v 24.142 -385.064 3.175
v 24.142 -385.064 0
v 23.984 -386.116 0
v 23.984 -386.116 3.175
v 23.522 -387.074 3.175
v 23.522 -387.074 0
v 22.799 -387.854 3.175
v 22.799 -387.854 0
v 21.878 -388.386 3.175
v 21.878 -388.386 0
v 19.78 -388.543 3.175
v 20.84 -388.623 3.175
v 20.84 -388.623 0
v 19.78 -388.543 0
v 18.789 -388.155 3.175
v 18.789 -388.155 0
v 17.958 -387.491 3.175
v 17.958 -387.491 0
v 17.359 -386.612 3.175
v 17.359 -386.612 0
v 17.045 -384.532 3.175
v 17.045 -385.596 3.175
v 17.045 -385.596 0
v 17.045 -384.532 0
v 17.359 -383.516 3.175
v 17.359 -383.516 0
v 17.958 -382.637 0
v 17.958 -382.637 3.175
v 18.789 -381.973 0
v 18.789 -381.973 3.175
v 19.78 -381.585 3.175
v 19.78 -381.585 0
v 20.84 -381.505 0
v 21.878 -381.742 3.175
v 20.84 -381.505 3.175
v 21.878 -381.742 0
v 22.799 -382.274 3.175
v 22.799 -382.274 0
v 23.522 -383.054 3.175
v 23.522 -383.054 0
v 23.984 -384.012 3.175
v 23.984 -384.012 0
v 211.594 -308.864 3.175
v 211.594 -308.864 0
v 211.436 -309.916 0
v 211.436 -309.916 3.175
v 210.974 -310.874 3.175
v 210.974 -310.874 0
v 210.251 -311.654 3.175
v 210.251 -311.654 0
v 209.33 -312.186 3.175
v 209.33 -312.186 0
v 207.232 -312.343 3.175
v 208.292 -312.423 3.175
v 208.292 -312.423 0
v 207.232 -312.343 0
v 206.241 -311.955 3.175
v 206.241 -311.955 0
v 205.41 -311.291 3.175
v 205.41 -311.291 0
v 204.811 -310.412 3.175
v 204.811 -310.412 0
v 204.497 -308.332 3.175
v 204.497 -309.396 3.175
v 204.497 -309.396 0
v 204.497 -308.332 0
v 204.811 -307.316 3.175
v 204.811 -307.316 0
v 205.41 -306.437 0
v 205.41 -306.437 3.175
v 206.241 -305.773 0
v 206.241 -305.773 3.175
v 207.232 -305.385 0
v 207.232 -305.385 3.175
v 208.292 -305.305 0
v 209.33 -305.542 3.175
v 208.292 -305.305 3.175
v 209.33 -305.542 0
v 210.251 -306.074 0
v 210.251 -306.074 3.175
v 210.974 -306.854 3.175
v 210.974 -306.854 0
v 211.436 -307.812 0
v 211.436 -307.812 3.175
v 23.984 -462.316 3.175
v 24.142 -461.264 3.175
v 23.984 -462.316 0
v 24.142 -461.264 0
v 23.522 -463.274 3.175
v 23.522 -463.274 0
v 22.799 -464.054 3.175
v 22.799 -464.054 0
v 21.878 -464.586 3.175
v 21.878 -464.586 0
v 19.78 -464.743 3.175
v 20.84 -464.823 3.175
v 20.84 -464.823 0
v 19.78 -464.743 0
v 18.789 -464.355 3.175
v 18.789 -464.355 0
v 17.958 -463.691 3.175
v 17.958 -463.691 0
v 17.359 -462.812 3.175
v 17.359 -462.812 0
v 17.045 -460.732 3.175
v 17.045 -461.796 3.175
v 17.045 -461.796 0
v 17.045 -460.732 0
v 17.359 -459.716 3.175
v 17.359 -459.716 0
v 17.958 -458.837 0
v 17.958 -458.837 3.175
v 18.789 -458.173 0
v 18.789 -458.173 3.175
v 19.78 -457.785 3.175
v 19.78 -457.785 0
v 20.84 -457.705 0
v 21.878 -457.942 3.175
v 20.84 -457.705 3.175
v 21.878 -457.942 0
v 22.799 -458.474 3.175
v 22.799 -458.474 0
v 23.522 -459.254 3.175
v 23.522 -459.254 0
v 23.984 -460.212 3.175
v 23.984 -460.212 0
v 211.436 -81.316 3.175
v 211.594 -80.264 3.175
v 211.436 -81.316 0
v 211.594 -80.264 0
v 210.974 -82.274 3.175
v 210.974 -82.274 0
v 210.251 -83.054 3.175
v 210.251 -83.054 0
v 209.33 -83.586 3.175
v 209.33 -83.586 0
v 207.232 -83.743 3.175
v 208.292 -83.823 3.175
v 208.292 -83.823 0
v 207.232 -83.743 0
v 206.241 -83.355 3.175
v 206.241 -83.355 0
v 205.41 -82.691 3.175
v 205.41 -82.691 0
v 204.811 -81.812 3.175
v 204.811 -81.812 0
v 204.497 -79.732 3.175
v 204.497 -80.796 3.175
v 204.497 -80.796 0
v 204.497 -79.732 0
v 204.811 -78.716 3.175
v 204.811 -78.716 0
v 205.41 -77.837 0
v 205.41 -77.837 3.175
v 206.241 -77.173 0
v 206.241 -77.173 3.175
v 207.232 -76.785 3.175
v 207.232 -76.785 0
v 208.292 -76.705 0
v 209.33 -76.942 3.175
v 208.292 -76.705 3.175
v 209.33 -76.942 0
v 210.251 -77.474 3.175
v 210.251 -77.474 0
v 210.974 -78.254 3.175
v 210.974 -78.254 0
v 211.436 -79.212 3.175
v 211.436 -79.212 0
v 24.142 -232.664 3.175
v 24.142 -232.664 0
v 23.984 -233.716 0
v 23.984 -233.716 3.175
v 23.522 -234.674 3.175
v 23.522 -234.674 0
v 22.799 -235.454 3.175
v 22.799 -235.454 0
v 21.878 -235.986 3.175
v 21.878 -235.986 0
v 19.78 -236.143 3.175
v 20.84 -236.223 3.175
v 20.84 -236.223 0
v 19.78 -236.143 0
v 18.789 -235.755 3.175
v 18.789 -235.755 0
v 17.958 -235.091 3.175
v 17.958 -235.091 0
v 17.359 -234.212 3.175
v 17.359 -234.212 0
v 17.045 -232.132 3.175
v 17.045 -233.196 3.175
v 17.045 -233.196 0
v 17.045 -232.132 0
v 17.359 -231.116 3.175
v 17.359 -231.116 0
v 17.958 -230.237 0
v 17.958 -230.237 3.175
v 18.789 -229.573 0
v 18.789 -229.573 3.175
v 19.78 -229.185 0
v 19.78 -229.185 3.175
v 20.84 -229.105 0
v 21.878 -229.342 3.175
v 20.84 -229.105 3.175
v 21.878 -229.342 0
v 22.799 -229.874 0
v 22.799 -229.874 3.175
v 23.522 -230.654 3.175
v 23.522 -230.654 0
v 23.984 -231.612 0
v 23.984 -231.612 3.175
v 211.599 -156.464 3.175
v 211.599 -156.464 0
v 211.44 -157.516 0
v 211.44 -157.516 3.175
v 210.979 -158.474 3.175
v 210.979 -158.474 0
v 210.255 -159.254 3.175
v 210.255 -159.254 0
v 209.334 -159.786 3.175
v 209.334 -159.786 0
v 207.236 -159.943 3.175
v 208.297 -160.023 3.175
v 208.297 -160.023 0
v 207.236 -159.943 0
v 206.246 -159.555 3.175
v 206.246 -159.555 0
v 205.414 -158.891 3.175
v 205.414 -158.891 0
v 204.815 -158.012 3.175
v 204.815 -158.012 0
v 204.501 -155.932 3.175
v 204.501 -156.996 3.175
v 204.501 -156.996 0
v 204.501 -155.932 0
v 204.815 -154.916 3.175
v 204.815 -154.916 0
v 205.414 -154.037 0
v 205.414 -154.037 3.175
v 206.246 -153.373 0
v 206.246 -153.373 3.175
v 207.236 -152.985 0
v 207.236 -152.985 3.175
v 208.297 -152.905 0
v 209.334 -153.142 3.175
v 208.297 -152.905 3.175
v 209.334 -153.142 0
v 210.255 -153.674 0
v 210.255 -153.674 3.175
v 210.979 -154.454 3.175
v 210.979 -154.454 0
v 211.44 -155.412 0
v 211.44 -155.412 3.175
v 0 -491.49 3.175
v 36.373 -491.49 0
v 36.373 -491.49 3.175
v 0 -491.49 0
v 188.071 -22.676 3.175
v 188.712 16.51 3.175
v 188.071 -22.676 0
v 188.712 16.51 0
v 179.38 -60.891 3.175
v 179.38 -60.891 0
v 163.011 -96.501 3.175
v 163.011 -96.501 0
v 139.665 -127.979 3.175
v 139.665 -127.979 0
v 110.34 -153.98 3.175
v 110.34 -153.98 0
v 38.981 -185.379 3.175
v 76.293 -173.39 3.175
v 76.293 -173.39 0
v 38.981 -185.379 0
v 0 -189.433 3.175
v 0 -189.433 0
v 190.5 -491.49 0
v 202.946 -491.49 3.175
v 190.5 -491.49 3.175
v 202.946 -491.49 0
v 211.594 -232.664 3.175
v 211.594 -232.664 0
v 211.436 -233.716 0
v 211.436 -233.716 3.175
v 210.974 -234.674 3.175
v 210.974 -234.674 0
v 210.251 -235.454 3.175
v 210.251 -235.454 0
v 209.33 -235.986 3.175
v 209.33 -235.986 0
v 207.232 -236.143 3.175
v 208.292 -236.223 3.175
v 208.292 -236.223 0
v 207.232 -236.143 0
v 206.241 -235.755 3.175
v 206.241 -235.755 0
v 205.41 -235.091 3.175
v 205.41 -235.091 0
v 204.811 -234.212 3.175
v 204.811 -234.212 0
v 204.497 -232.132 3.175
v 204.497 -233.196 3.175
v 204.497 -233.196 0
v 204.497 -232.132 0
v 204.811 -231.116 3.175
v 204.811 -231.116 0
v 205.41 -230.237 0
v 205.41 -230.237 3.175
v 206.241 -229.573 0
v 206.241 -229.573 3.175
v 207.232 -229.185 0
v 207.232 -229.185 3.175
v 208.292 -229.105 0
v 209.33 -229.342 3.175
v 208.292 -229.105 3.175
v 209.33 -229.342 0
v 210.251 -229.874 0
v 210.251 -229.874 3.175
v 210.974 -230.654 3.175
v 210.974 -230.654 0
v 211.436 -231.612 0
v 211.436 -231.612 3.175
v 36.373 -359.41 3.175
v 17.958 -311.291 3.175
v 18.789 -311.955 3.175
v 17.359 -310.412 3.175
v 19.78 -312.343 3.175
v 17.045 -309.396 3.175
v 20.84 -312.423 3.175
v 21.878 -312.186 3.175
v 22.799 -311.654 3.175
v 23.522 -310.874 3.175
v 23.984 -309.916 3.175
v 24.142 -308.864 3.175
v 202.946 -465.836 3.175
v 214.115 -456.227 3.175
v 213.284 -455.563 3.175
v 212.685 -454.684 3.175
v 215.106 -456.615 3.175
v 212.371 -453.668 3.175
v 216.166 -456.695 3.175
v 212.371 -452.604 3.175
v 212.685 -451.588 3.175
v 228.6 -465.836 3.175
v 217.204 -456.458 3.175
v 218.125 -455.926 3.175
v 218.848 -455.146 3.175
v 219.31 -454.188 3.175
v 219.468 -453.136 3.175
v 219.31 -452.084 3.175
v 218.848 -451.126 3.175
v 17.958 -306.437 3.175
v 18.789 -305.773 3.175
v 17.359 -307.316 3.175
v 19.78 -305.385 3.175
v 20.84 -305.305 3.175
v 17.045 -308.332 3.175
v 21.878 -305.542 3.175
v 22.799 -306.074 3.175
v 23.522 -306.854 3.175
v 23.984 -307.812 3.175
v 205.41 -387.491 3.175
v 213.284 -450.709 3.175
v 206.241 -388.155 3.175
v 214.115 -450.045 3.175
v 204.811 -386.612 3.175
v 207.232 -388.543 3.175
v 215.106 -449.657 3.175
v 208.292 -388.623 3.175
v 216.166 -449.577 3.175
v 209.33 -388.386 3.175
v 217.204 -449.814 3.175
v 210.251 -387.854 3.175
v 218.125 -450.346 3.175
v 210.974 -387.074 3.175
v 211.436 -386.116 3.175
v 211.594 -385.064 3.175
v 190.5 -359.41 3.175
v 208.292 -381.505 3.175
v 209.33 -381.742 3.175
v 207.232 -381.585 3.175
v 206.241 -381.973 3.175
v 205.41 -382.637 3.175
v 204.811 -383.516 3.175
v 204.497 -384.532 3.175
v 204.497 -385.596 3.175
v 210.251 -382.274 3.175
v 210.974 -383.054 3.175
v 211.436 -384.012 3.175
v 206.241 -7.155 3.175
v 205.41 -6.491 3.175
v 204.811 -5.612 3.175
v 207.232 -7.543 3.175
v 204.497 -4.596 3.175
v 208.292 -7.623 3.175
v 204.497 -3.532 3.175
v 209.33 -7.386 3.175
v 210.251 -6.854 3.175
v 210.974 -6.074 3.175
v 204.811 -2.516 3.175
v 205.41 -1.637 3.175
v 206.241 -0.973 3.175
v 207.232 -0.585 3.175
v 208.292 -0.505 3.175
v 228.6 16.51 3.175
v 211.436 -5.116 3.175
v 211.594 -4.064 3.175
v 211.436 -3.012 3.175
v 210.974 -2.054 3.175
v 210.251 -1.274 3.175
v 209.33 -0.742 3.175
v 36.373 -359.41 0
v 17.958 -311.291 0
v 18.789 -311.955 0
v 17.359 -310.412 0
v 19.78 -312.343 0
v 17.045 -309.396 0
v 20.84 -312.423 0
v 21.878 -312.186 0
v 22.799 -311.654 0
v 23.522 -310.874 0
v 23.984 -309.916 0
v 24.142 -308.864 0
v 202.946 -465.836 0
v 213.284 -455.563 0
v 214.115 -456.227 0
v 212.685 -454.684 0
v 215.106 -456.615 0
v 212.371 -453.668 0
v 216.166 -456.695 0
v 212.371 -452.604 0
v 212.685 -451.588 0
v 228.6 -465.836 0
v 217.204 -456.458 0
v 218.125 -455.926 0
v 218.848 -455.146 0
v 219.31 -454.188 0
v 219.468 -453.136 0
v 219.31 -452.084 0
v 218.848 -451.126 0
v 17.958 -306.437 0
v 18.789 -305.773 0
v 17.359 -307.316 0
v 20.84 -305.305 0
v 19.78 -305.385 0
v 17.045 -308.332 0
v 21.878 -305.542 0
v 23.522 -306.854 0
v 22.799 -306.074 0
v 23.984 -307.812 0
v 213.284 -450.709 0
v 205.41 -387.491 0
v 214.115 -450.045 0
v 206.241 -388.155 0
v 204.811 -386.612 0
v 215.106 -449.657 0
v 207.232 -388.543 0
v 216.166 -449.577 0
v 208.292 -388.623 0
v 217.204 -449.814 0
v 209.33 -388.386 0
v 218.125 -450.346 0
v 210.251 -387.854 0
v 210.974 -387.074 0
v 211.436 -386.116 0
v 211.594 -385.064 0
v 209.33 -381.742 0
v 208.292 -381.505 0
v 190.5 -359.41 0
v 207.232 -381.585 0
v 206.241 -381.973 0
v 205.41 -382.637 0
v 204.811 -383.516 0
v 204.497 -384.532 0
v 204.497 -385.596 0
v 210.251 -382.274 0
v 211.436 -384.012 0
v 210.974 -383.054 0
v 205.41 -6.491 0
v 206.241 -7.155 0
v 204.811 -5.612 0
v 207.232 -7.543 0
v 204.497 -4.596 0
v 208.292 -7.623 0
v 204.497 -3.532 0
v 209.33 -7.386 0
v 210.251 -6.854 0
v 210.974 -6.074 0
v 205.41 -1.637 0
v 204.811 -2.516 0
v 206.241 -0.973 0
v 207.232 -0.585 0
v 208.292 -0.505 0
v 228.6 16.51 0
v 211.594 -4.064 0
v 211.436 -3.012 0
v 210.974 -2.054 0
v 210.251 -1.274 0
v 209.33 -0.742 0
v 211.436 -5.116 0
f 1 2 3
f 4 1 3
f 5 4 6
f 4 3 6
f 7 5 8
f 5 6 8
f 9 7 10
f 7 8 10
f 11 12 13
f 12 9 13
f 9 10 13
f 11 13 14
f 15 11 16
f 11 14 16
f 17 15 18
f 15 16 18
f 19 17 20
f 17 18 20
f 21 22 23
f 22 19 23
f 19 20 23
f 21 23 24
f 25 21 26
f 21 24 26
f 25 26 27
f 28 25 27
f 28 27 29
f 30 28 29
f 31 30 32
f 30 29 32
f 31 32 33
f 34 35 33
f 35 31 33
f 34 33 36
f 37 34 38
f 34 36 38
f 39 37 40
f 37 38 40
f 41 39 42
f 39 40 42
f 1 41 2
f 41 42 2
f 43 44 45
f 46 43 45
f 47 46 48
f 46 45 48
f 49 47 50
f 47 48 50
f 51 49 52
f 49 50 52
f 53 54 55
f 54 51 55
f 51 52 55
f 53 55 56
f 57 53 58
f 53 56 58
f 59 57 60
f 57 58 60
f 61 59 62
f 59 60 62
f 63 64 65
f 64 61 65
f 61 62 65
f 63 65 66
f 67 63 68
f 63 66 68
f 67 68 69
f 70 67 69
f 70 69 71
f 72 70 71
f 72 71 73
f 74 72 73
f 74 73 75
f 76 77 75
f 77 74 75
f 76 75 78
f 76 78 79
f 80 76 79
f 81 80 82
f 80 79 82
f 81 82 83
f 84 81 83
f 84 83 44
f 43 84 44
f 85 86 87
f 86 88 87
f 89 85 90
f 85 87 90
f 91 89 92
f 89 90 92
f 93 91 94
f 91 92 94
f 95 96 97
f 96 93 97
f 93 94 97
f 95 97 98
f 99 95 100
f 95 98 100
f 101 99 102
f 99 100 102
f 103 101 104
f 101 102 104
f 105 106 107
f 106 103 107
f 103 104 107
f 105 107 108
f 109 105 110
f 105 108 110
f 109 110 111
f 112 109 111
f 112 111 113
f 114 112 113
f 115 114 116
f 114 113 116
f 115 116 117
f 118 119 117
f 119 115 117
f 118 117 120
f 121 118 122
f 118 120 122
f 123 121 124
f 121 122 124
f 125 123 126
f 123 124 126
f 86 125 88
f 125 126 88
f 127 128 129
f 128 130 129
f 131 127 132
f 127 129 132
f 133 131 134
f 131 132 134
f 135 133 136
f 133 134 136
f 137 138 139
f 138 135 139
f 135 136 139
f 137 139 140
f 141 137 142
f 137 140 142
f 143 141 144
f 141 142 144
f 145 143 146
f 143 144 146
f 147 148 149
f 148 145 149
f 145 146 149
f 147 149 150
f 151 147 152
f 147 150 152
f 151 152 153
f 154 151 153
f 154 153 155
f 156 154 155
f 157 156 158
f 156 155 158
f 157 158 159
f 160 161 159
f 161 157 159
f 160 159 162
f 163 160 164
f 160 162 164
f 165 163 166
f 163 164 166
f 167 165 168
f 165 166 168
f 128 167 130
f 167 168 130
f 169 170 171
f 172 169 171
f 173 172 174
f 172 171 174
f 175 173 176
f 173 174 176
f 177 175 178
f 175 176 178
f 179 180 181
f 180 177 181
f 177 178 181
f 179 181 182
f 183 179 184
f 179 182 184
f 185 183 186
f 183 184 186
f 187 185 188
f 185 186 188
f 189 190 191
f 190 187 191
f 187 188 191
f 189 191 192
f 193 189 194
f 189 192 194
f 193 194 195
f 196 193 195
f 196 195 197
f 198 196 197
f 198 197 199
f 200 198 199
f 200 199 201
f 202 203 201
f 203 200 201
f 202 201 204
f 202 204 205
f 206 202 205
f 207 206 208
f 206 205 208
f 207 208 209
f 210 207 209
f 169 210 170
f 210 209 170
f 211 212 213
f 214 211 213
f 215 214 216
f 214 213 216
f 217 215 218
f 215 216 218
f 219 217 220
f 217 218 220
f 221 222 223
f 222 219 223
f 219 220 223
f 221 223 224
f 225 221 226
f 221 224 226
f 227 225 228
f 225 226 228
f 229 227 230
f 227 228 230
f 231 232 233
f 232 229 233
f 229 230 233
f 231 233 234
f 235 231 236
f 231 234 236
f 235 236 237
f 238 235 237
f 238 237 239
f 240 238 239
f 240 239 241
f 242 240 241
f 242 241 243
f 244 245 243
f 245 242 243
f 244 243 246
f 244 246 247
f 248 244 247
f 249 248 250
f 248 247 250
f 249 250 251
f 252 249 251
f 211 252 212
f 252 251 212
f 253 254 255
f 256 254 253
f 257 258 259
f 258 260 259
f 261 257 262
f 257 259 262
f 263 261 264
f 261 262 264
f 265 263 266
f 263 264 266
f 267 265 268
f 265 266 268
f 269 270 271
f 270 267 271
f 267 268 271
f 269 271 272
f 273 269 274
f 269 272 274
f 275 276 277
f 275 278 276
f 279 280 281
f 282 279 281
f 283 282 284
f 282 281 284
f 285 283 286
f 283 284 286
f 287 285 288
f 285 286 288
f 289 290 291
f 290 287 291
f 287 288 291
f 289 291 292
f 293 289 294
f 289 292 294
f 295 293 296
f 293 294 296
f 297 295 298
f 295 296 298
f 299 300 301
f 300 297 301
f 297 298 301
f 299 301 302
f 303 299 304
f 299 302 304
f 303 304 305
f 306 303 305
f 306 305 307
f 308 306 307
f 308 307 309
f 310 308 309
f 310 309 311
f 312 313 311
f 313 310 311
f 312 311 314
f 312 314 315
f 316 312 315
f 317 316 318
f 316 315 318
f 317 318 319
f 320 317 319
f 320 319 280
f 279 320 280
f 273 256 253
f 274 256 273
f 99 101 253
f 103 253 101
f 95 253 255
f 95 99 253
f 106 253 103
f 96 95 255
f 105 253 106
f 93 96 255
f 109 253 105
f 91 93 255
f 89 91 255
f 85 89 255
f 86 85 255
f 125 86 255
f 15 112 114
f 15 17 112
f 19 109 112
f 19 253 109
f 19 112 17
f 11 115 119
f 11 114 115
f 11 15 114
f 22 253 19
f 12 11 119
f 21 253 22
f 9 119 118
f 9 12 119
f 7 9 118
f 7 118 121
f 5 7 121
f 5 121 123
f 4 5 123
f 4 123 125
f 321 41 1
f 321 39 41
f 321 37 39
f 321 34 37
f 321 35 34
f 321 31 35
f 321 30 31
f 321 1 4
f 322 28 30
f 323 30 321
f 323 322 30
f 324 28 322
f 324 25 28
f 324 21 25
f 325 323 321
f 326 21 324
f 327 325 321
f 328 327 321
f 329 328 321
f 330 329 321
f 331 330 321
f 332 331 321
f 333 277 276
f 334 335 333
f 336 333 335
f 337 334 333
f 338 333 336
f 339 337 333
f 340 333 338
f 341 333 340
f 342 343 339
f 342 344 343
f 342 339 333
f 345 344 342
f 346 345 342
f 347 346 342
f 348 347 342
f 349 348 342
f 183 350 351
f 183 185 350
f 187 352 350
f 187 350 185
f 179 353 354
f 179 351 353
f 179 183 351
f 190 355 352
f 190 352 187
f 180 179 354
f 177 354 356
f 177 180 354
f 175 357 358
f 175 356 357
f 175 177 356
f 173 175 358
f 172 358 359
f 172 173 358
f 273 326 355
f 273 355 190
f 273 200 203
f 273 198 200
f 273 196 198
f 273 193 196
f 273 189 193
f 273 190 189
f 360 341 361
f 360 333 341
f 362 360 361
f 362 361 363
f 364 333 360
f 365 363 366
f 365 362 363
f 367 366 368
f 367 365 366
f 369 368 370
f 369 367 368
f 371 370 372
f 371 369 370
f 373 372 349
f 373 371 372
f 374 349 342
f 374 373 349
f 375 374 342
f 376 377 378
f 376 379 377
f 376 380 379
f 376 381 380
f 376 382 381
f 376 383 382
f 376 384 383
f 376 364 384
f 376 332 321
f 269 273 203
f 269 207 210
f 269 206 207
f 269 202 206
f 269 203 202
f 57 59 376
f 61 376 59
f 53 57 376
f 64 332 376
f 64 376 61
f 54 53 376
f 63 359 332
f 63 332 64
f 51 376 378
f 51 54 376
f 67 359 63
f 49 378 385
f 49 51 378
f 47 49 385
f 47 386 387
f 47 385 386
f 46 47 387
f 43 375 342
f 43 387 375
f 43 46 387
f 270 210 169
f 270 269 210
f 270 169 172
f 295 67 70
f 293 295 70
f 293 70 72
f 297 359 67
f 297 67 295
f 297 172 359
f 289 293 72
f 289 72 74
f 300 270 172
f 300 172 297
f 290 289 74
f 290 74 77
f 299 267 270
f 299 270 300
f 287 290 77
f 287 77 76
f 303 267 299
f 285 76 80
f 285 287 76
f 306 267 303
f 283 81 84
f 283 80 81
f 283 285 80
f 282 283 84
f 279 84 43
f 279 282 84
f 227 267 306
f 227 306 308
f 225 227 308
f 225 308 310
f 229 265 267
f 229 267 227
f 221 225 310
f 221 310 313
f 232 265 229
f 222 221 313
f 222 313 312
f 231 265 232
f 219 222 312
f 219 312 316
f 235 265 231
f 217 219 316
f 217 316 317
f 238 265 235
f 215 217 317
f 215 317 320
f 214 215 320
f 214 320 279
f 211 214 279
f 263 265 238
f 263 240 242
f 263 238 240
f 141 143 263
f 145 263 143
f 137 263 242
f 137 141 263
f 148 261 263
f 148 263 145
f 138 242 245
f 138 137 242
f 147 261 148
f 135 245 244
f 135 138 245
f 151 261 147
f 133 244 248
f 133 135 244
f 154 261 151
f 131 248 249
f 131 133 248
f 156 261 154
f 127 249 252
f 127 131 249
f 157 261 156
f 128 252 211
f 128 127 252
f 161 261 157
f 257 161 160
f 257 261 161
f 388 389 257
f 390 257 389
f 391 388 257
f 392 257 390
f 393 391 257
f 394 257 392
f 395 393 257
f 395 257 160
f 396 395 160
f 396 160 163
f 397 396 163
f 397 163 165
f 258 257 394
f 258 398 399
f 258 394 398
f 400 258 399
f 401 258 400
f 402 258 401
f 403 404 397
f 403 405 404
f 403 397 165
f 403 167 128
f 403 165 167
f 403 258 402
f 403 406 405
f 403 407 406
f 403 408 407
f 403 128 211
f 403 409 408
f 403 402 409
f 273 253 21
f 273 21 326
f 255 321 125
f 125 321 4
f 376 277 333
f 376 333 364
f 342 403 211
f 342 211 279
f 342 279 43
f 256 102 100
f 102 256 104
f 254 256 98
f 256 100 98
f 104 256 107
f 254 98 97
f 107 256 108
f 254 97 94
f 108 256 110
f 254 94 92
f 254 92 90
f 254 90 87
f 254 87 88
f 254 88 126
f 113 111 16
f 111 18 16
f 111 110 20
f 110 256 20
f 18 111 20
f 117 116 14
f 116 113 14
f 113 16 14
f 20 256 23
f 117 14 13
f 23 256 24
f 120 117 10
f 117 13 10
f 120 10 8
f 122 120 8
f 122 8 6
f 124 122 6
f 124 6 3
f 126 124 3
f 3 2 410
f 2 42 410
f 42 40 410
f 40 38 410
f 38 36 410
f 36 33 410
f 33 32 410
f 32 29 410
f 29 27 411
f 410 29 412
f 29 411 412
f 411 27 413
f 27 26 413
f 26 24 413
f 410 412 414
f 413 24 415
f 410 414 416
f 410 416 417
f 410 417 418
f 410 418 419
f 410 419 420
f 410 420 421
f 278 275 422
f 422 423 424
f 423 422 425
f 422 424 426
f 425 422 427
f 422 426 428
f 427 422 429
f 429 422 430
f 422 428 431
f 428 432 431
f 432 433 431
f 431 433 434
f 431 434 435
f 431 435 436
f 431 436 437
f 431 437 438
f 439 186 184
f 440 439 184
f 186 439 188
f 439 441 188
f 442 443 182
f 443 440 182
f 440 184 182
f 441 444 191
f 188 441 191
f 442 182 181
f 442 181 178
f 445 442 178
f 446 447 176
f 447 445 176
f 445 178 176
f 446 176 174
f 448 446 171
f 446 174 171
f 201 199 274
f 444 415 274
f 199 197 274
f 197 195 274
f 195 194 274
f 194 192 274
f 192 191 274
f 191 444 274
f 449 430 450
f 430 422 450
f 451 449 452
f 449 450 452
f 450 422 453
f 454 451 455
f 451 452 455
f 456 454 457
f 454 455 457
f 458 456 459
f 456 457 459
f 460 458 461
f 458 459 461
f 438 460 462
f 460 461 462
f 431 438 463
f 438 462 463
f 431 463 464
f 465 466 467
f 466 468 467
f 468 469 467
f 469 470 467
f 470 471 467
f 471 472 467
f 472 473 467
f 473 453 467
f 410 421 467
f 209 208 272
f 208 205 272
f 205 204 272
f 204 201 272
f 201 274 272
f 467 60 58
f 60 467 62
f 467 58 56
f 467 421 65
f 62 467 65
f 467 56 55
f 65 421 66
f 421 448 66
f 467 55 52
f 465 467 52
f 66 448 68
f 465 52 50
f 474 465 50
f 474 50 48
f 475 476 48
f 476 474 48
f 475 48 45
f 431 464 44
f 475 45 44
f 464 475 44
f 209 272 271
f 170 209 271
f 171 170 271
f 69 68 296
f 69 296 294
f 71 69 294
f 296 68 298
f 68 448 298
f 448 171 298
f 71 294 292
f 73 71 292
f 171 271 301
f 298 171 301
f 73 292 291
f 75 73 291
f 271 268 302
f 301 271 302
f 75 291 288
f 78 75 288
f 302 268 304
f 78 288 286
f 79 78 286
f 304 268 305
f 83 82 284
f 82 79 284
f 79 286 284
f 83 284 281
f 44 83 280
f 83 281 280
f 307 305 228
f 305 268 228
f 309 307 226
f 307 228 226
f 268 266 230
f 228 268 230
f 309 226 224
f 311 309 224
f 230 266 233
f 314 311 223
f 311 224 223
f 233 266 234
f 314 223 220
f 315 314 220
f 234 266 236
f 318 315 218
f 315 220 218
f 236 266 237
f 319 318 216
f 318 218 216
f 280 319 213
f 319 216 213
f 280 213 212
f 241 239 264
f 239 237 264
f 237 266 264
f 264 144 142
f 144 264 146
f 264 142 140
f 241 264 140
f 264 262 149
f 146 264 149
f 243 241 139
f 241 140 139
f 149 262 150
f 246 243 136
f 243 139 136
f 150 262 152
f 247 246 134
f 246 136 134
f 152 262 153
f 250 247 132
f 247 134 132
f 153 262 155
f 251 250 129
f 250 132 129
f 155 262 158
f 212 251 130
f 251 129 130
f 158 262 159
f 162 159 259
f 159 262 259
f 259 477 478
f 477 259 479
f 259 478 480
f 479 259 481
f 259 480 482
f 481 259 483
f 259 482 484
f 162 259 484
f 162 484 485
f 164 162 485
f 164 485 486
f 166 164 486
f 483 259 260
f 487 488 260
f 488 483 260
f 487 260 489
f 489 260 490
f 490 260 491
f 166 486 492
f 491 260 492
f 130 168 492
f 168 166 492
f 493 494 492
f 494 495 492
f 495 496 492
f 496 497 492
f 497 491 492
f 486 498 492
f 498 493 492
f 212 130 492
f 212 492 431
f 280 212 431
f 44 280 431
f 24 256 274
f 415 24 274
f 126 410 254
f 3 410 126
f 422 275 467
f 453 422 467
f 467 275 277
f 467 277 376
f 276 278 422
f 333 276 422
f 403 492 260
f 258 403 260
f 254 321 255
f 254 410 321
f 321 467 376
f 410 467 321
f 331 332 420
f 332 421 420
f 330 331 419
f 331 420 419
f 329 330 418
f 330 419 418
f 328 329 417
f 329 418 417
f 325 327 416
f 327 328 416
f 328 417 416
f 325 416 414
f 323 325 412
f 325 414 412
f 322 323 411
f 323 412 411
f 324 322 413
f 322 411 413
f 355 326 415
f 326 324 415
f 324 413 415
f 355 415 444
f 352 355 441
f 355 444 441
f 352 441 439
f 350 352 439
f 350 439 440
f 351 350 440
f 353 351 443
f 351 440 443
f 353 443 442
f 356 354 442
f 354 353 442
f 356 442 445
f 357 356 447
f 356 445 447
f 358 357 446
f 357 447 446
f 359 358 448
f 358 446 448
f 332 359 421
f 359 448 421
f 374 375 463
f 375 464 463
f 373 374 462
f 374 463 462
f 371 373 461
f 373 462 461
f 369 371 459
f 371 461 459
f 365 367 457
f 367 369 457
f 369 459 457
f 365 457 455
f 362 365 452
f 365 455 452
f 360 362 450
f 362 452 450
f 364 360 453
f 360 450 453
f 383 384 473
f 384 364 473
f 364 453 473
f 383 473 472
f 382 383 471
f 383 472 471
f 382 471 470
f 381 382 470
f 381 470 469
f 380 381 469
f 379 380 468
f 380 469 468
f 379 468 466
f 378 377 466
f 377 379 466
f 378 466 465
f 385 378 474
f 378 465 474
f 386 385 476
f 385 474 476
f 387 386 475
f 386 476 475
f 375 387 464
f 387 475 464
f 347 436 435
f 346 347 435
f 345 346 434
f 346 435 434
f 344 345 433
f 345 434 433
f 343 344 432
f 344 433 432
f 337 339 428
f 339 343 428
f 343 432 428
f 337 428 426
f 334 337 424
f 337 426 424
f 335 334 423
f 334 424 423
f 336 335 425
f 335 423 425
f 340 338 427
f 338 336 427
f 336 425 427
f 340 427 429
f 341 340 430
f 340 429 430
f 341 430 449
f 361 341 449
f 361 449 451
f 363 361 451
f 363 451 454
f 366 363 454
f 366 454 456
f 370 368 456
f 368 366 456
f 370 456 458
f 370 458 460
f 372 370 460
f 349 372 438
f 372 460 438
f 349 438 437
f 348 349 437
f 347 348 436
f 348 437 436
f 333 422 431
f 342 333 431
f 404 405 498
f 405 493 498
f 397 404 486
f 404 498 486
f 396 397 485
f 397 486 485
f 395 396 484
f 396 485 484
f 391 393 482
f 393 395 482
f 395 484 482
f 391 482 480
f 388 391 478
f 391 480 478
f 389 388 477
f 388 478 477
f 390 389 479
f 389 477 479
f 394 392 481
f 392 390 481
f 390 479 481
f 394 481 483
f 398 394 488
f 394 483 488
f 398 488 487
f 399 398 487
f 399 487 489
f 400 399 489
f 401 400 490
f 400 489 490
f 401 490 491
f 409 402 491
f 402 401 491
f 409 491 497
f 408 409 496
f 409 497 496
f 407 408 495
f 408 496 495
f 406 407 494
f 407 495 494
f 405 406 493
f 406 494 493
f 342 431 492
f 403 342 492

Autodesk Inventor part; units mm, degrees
ref_plane "YZ Plane" through (0, 0, 0) normal (1, 0, 0) x (0, 1, 0)
ref_plane "XZ Plane" through (0, 0, 0) normal (0, 1, 0) x (-1, 0, 0)
ref_plane "XY Plane" through (0, 0, 0) normal (0, 0, 1) x (1, 0, 0)
sketch "Sketch1" plane through (0, 0, 0) normal (0, 0, 1) x (1, 0, 0)
  line L0 (229.6952, -414.7737) -> (228.902, -414.7737)
  line L1 (202.9458, -491.49) -> (202.9458, -465.836)
  line L2 (202.9458, -465.836) -> (228.5998, -465.836)
  line L3 (202.9458, -491.49) -> (-0.0002, -491.49)
  line L4 (-0.0002, -491.49) -> (-0.0002, -189.4332)
  arc A0 (-0.0002, -189.4332) -> (188.7124, 16.51) centre (0, 0) ccw
  line L5 (0, 0) -> (188.7124, 16.51) construction
  line L6 (0, 0) -> (-0.0002, -189.4332) construction
  line L7 (228.5998, -465.836) -> (228.5998, 16.51)
  line L8 (228.5998, 16.51) -> (188.7124, 16.51)
  circle A1 centre (20.5738, -232.664) radius 3.5687
  circle A2 centre (20.5738, -308.864) radius 3.5687
  circle A3 centre (20.5738, -385.064) radius 3.5687
  circle A4 centre (20.5738, -461.264) radius 3.5687
  circle A5 centre (215.8998, -453.136) radius 3.5687
  circle A6 centre (208.0258, -385.064) radius 3.5687
  circle A7 centre (208.0258, -308.864) radius 3.5687
  circle A8 centre (208.0258, -232.664) radius 3.5687
  circle A9 centre (208.0301, -156.464) radius 3.5687
  circle A10 centre (208.0258, -80.264) radius 3.5687
  circle A11 centre (208.0258, -4.064) radius 3.5687
  line L9 (36.3726, -491.49) -> (190.4998, -491.49)
  line L10 (190.4998, -491.49) -> (190.4998, -359.41)
  line L11 (190.4998, -359.41) -> (36.3726, -359.41)
  line L12 (36.3726, -359.41) -> (36.3726, -491.49)
  point P0 (208.0258, -461.264)
  dimension "d15" = 25.654
  dimension "d59" = 95
  dimension "d60" = 189.4332
  dimension "d61" = 508
  dimension "d62" = 76.2
  dimension "d63" = 76.2
  dimension "d65" = 20.5697
  dimension "d66" = 20.574
  dimension "d67" = 20.574
  dimension "d68" = 76.2
  dimension "d69" = 76.2
  dimension "d70" = 76.2
  dimension "d71" = 76.2
  dimension "d73" = 25.654
  dimension "d74" = 12.7
  dimension "d75" = 76.2
  dimension "d76" = 76.2
  dimension "d77" = 76.2
  dimension "d78" = 43.2308
  dimension "d79" = 20.574
  dimension "d80" = 20.574
  dimension "d81" = 20.574
  dimension "d82" = 20.574
  dimension "d85" = 7.1374
  dimension "d86" = 7.1374
  dimension "d87" = 7.1374
  dimension "d88" = 7.1374
  dimension "d89" = 7.1374
  dimension "d91" = 7.1374
  dimension "d92" = 7.1374
  dimension "d93" = 7.1374
  dimension "d94" = 7.1374
  dimension "d95" = 7.1374
  dimension "d96" = 7.1374
  dimension "d99" = 228.6
  dimension "d100" = 12.7
  dimension "d103" = 20.574
  dimension "d104" = 20.574
  dimension "d105" = 20.574
  dimension "d106" = 20.574
  dimension "d108" = 30.226
  dimension "d109" = 106.426
  dimension "d112" = 154.1272
  dimension "d113" = 132.08
  dimension "d114" = 12.446
extrude "Extrusion6" add sketch "Sketch1" along normal blind 3.175 contours L3 L10 L11 L12 L4 A0 L8 L7 L2 L1
properties part number "LauncherSidePlateRev2"
